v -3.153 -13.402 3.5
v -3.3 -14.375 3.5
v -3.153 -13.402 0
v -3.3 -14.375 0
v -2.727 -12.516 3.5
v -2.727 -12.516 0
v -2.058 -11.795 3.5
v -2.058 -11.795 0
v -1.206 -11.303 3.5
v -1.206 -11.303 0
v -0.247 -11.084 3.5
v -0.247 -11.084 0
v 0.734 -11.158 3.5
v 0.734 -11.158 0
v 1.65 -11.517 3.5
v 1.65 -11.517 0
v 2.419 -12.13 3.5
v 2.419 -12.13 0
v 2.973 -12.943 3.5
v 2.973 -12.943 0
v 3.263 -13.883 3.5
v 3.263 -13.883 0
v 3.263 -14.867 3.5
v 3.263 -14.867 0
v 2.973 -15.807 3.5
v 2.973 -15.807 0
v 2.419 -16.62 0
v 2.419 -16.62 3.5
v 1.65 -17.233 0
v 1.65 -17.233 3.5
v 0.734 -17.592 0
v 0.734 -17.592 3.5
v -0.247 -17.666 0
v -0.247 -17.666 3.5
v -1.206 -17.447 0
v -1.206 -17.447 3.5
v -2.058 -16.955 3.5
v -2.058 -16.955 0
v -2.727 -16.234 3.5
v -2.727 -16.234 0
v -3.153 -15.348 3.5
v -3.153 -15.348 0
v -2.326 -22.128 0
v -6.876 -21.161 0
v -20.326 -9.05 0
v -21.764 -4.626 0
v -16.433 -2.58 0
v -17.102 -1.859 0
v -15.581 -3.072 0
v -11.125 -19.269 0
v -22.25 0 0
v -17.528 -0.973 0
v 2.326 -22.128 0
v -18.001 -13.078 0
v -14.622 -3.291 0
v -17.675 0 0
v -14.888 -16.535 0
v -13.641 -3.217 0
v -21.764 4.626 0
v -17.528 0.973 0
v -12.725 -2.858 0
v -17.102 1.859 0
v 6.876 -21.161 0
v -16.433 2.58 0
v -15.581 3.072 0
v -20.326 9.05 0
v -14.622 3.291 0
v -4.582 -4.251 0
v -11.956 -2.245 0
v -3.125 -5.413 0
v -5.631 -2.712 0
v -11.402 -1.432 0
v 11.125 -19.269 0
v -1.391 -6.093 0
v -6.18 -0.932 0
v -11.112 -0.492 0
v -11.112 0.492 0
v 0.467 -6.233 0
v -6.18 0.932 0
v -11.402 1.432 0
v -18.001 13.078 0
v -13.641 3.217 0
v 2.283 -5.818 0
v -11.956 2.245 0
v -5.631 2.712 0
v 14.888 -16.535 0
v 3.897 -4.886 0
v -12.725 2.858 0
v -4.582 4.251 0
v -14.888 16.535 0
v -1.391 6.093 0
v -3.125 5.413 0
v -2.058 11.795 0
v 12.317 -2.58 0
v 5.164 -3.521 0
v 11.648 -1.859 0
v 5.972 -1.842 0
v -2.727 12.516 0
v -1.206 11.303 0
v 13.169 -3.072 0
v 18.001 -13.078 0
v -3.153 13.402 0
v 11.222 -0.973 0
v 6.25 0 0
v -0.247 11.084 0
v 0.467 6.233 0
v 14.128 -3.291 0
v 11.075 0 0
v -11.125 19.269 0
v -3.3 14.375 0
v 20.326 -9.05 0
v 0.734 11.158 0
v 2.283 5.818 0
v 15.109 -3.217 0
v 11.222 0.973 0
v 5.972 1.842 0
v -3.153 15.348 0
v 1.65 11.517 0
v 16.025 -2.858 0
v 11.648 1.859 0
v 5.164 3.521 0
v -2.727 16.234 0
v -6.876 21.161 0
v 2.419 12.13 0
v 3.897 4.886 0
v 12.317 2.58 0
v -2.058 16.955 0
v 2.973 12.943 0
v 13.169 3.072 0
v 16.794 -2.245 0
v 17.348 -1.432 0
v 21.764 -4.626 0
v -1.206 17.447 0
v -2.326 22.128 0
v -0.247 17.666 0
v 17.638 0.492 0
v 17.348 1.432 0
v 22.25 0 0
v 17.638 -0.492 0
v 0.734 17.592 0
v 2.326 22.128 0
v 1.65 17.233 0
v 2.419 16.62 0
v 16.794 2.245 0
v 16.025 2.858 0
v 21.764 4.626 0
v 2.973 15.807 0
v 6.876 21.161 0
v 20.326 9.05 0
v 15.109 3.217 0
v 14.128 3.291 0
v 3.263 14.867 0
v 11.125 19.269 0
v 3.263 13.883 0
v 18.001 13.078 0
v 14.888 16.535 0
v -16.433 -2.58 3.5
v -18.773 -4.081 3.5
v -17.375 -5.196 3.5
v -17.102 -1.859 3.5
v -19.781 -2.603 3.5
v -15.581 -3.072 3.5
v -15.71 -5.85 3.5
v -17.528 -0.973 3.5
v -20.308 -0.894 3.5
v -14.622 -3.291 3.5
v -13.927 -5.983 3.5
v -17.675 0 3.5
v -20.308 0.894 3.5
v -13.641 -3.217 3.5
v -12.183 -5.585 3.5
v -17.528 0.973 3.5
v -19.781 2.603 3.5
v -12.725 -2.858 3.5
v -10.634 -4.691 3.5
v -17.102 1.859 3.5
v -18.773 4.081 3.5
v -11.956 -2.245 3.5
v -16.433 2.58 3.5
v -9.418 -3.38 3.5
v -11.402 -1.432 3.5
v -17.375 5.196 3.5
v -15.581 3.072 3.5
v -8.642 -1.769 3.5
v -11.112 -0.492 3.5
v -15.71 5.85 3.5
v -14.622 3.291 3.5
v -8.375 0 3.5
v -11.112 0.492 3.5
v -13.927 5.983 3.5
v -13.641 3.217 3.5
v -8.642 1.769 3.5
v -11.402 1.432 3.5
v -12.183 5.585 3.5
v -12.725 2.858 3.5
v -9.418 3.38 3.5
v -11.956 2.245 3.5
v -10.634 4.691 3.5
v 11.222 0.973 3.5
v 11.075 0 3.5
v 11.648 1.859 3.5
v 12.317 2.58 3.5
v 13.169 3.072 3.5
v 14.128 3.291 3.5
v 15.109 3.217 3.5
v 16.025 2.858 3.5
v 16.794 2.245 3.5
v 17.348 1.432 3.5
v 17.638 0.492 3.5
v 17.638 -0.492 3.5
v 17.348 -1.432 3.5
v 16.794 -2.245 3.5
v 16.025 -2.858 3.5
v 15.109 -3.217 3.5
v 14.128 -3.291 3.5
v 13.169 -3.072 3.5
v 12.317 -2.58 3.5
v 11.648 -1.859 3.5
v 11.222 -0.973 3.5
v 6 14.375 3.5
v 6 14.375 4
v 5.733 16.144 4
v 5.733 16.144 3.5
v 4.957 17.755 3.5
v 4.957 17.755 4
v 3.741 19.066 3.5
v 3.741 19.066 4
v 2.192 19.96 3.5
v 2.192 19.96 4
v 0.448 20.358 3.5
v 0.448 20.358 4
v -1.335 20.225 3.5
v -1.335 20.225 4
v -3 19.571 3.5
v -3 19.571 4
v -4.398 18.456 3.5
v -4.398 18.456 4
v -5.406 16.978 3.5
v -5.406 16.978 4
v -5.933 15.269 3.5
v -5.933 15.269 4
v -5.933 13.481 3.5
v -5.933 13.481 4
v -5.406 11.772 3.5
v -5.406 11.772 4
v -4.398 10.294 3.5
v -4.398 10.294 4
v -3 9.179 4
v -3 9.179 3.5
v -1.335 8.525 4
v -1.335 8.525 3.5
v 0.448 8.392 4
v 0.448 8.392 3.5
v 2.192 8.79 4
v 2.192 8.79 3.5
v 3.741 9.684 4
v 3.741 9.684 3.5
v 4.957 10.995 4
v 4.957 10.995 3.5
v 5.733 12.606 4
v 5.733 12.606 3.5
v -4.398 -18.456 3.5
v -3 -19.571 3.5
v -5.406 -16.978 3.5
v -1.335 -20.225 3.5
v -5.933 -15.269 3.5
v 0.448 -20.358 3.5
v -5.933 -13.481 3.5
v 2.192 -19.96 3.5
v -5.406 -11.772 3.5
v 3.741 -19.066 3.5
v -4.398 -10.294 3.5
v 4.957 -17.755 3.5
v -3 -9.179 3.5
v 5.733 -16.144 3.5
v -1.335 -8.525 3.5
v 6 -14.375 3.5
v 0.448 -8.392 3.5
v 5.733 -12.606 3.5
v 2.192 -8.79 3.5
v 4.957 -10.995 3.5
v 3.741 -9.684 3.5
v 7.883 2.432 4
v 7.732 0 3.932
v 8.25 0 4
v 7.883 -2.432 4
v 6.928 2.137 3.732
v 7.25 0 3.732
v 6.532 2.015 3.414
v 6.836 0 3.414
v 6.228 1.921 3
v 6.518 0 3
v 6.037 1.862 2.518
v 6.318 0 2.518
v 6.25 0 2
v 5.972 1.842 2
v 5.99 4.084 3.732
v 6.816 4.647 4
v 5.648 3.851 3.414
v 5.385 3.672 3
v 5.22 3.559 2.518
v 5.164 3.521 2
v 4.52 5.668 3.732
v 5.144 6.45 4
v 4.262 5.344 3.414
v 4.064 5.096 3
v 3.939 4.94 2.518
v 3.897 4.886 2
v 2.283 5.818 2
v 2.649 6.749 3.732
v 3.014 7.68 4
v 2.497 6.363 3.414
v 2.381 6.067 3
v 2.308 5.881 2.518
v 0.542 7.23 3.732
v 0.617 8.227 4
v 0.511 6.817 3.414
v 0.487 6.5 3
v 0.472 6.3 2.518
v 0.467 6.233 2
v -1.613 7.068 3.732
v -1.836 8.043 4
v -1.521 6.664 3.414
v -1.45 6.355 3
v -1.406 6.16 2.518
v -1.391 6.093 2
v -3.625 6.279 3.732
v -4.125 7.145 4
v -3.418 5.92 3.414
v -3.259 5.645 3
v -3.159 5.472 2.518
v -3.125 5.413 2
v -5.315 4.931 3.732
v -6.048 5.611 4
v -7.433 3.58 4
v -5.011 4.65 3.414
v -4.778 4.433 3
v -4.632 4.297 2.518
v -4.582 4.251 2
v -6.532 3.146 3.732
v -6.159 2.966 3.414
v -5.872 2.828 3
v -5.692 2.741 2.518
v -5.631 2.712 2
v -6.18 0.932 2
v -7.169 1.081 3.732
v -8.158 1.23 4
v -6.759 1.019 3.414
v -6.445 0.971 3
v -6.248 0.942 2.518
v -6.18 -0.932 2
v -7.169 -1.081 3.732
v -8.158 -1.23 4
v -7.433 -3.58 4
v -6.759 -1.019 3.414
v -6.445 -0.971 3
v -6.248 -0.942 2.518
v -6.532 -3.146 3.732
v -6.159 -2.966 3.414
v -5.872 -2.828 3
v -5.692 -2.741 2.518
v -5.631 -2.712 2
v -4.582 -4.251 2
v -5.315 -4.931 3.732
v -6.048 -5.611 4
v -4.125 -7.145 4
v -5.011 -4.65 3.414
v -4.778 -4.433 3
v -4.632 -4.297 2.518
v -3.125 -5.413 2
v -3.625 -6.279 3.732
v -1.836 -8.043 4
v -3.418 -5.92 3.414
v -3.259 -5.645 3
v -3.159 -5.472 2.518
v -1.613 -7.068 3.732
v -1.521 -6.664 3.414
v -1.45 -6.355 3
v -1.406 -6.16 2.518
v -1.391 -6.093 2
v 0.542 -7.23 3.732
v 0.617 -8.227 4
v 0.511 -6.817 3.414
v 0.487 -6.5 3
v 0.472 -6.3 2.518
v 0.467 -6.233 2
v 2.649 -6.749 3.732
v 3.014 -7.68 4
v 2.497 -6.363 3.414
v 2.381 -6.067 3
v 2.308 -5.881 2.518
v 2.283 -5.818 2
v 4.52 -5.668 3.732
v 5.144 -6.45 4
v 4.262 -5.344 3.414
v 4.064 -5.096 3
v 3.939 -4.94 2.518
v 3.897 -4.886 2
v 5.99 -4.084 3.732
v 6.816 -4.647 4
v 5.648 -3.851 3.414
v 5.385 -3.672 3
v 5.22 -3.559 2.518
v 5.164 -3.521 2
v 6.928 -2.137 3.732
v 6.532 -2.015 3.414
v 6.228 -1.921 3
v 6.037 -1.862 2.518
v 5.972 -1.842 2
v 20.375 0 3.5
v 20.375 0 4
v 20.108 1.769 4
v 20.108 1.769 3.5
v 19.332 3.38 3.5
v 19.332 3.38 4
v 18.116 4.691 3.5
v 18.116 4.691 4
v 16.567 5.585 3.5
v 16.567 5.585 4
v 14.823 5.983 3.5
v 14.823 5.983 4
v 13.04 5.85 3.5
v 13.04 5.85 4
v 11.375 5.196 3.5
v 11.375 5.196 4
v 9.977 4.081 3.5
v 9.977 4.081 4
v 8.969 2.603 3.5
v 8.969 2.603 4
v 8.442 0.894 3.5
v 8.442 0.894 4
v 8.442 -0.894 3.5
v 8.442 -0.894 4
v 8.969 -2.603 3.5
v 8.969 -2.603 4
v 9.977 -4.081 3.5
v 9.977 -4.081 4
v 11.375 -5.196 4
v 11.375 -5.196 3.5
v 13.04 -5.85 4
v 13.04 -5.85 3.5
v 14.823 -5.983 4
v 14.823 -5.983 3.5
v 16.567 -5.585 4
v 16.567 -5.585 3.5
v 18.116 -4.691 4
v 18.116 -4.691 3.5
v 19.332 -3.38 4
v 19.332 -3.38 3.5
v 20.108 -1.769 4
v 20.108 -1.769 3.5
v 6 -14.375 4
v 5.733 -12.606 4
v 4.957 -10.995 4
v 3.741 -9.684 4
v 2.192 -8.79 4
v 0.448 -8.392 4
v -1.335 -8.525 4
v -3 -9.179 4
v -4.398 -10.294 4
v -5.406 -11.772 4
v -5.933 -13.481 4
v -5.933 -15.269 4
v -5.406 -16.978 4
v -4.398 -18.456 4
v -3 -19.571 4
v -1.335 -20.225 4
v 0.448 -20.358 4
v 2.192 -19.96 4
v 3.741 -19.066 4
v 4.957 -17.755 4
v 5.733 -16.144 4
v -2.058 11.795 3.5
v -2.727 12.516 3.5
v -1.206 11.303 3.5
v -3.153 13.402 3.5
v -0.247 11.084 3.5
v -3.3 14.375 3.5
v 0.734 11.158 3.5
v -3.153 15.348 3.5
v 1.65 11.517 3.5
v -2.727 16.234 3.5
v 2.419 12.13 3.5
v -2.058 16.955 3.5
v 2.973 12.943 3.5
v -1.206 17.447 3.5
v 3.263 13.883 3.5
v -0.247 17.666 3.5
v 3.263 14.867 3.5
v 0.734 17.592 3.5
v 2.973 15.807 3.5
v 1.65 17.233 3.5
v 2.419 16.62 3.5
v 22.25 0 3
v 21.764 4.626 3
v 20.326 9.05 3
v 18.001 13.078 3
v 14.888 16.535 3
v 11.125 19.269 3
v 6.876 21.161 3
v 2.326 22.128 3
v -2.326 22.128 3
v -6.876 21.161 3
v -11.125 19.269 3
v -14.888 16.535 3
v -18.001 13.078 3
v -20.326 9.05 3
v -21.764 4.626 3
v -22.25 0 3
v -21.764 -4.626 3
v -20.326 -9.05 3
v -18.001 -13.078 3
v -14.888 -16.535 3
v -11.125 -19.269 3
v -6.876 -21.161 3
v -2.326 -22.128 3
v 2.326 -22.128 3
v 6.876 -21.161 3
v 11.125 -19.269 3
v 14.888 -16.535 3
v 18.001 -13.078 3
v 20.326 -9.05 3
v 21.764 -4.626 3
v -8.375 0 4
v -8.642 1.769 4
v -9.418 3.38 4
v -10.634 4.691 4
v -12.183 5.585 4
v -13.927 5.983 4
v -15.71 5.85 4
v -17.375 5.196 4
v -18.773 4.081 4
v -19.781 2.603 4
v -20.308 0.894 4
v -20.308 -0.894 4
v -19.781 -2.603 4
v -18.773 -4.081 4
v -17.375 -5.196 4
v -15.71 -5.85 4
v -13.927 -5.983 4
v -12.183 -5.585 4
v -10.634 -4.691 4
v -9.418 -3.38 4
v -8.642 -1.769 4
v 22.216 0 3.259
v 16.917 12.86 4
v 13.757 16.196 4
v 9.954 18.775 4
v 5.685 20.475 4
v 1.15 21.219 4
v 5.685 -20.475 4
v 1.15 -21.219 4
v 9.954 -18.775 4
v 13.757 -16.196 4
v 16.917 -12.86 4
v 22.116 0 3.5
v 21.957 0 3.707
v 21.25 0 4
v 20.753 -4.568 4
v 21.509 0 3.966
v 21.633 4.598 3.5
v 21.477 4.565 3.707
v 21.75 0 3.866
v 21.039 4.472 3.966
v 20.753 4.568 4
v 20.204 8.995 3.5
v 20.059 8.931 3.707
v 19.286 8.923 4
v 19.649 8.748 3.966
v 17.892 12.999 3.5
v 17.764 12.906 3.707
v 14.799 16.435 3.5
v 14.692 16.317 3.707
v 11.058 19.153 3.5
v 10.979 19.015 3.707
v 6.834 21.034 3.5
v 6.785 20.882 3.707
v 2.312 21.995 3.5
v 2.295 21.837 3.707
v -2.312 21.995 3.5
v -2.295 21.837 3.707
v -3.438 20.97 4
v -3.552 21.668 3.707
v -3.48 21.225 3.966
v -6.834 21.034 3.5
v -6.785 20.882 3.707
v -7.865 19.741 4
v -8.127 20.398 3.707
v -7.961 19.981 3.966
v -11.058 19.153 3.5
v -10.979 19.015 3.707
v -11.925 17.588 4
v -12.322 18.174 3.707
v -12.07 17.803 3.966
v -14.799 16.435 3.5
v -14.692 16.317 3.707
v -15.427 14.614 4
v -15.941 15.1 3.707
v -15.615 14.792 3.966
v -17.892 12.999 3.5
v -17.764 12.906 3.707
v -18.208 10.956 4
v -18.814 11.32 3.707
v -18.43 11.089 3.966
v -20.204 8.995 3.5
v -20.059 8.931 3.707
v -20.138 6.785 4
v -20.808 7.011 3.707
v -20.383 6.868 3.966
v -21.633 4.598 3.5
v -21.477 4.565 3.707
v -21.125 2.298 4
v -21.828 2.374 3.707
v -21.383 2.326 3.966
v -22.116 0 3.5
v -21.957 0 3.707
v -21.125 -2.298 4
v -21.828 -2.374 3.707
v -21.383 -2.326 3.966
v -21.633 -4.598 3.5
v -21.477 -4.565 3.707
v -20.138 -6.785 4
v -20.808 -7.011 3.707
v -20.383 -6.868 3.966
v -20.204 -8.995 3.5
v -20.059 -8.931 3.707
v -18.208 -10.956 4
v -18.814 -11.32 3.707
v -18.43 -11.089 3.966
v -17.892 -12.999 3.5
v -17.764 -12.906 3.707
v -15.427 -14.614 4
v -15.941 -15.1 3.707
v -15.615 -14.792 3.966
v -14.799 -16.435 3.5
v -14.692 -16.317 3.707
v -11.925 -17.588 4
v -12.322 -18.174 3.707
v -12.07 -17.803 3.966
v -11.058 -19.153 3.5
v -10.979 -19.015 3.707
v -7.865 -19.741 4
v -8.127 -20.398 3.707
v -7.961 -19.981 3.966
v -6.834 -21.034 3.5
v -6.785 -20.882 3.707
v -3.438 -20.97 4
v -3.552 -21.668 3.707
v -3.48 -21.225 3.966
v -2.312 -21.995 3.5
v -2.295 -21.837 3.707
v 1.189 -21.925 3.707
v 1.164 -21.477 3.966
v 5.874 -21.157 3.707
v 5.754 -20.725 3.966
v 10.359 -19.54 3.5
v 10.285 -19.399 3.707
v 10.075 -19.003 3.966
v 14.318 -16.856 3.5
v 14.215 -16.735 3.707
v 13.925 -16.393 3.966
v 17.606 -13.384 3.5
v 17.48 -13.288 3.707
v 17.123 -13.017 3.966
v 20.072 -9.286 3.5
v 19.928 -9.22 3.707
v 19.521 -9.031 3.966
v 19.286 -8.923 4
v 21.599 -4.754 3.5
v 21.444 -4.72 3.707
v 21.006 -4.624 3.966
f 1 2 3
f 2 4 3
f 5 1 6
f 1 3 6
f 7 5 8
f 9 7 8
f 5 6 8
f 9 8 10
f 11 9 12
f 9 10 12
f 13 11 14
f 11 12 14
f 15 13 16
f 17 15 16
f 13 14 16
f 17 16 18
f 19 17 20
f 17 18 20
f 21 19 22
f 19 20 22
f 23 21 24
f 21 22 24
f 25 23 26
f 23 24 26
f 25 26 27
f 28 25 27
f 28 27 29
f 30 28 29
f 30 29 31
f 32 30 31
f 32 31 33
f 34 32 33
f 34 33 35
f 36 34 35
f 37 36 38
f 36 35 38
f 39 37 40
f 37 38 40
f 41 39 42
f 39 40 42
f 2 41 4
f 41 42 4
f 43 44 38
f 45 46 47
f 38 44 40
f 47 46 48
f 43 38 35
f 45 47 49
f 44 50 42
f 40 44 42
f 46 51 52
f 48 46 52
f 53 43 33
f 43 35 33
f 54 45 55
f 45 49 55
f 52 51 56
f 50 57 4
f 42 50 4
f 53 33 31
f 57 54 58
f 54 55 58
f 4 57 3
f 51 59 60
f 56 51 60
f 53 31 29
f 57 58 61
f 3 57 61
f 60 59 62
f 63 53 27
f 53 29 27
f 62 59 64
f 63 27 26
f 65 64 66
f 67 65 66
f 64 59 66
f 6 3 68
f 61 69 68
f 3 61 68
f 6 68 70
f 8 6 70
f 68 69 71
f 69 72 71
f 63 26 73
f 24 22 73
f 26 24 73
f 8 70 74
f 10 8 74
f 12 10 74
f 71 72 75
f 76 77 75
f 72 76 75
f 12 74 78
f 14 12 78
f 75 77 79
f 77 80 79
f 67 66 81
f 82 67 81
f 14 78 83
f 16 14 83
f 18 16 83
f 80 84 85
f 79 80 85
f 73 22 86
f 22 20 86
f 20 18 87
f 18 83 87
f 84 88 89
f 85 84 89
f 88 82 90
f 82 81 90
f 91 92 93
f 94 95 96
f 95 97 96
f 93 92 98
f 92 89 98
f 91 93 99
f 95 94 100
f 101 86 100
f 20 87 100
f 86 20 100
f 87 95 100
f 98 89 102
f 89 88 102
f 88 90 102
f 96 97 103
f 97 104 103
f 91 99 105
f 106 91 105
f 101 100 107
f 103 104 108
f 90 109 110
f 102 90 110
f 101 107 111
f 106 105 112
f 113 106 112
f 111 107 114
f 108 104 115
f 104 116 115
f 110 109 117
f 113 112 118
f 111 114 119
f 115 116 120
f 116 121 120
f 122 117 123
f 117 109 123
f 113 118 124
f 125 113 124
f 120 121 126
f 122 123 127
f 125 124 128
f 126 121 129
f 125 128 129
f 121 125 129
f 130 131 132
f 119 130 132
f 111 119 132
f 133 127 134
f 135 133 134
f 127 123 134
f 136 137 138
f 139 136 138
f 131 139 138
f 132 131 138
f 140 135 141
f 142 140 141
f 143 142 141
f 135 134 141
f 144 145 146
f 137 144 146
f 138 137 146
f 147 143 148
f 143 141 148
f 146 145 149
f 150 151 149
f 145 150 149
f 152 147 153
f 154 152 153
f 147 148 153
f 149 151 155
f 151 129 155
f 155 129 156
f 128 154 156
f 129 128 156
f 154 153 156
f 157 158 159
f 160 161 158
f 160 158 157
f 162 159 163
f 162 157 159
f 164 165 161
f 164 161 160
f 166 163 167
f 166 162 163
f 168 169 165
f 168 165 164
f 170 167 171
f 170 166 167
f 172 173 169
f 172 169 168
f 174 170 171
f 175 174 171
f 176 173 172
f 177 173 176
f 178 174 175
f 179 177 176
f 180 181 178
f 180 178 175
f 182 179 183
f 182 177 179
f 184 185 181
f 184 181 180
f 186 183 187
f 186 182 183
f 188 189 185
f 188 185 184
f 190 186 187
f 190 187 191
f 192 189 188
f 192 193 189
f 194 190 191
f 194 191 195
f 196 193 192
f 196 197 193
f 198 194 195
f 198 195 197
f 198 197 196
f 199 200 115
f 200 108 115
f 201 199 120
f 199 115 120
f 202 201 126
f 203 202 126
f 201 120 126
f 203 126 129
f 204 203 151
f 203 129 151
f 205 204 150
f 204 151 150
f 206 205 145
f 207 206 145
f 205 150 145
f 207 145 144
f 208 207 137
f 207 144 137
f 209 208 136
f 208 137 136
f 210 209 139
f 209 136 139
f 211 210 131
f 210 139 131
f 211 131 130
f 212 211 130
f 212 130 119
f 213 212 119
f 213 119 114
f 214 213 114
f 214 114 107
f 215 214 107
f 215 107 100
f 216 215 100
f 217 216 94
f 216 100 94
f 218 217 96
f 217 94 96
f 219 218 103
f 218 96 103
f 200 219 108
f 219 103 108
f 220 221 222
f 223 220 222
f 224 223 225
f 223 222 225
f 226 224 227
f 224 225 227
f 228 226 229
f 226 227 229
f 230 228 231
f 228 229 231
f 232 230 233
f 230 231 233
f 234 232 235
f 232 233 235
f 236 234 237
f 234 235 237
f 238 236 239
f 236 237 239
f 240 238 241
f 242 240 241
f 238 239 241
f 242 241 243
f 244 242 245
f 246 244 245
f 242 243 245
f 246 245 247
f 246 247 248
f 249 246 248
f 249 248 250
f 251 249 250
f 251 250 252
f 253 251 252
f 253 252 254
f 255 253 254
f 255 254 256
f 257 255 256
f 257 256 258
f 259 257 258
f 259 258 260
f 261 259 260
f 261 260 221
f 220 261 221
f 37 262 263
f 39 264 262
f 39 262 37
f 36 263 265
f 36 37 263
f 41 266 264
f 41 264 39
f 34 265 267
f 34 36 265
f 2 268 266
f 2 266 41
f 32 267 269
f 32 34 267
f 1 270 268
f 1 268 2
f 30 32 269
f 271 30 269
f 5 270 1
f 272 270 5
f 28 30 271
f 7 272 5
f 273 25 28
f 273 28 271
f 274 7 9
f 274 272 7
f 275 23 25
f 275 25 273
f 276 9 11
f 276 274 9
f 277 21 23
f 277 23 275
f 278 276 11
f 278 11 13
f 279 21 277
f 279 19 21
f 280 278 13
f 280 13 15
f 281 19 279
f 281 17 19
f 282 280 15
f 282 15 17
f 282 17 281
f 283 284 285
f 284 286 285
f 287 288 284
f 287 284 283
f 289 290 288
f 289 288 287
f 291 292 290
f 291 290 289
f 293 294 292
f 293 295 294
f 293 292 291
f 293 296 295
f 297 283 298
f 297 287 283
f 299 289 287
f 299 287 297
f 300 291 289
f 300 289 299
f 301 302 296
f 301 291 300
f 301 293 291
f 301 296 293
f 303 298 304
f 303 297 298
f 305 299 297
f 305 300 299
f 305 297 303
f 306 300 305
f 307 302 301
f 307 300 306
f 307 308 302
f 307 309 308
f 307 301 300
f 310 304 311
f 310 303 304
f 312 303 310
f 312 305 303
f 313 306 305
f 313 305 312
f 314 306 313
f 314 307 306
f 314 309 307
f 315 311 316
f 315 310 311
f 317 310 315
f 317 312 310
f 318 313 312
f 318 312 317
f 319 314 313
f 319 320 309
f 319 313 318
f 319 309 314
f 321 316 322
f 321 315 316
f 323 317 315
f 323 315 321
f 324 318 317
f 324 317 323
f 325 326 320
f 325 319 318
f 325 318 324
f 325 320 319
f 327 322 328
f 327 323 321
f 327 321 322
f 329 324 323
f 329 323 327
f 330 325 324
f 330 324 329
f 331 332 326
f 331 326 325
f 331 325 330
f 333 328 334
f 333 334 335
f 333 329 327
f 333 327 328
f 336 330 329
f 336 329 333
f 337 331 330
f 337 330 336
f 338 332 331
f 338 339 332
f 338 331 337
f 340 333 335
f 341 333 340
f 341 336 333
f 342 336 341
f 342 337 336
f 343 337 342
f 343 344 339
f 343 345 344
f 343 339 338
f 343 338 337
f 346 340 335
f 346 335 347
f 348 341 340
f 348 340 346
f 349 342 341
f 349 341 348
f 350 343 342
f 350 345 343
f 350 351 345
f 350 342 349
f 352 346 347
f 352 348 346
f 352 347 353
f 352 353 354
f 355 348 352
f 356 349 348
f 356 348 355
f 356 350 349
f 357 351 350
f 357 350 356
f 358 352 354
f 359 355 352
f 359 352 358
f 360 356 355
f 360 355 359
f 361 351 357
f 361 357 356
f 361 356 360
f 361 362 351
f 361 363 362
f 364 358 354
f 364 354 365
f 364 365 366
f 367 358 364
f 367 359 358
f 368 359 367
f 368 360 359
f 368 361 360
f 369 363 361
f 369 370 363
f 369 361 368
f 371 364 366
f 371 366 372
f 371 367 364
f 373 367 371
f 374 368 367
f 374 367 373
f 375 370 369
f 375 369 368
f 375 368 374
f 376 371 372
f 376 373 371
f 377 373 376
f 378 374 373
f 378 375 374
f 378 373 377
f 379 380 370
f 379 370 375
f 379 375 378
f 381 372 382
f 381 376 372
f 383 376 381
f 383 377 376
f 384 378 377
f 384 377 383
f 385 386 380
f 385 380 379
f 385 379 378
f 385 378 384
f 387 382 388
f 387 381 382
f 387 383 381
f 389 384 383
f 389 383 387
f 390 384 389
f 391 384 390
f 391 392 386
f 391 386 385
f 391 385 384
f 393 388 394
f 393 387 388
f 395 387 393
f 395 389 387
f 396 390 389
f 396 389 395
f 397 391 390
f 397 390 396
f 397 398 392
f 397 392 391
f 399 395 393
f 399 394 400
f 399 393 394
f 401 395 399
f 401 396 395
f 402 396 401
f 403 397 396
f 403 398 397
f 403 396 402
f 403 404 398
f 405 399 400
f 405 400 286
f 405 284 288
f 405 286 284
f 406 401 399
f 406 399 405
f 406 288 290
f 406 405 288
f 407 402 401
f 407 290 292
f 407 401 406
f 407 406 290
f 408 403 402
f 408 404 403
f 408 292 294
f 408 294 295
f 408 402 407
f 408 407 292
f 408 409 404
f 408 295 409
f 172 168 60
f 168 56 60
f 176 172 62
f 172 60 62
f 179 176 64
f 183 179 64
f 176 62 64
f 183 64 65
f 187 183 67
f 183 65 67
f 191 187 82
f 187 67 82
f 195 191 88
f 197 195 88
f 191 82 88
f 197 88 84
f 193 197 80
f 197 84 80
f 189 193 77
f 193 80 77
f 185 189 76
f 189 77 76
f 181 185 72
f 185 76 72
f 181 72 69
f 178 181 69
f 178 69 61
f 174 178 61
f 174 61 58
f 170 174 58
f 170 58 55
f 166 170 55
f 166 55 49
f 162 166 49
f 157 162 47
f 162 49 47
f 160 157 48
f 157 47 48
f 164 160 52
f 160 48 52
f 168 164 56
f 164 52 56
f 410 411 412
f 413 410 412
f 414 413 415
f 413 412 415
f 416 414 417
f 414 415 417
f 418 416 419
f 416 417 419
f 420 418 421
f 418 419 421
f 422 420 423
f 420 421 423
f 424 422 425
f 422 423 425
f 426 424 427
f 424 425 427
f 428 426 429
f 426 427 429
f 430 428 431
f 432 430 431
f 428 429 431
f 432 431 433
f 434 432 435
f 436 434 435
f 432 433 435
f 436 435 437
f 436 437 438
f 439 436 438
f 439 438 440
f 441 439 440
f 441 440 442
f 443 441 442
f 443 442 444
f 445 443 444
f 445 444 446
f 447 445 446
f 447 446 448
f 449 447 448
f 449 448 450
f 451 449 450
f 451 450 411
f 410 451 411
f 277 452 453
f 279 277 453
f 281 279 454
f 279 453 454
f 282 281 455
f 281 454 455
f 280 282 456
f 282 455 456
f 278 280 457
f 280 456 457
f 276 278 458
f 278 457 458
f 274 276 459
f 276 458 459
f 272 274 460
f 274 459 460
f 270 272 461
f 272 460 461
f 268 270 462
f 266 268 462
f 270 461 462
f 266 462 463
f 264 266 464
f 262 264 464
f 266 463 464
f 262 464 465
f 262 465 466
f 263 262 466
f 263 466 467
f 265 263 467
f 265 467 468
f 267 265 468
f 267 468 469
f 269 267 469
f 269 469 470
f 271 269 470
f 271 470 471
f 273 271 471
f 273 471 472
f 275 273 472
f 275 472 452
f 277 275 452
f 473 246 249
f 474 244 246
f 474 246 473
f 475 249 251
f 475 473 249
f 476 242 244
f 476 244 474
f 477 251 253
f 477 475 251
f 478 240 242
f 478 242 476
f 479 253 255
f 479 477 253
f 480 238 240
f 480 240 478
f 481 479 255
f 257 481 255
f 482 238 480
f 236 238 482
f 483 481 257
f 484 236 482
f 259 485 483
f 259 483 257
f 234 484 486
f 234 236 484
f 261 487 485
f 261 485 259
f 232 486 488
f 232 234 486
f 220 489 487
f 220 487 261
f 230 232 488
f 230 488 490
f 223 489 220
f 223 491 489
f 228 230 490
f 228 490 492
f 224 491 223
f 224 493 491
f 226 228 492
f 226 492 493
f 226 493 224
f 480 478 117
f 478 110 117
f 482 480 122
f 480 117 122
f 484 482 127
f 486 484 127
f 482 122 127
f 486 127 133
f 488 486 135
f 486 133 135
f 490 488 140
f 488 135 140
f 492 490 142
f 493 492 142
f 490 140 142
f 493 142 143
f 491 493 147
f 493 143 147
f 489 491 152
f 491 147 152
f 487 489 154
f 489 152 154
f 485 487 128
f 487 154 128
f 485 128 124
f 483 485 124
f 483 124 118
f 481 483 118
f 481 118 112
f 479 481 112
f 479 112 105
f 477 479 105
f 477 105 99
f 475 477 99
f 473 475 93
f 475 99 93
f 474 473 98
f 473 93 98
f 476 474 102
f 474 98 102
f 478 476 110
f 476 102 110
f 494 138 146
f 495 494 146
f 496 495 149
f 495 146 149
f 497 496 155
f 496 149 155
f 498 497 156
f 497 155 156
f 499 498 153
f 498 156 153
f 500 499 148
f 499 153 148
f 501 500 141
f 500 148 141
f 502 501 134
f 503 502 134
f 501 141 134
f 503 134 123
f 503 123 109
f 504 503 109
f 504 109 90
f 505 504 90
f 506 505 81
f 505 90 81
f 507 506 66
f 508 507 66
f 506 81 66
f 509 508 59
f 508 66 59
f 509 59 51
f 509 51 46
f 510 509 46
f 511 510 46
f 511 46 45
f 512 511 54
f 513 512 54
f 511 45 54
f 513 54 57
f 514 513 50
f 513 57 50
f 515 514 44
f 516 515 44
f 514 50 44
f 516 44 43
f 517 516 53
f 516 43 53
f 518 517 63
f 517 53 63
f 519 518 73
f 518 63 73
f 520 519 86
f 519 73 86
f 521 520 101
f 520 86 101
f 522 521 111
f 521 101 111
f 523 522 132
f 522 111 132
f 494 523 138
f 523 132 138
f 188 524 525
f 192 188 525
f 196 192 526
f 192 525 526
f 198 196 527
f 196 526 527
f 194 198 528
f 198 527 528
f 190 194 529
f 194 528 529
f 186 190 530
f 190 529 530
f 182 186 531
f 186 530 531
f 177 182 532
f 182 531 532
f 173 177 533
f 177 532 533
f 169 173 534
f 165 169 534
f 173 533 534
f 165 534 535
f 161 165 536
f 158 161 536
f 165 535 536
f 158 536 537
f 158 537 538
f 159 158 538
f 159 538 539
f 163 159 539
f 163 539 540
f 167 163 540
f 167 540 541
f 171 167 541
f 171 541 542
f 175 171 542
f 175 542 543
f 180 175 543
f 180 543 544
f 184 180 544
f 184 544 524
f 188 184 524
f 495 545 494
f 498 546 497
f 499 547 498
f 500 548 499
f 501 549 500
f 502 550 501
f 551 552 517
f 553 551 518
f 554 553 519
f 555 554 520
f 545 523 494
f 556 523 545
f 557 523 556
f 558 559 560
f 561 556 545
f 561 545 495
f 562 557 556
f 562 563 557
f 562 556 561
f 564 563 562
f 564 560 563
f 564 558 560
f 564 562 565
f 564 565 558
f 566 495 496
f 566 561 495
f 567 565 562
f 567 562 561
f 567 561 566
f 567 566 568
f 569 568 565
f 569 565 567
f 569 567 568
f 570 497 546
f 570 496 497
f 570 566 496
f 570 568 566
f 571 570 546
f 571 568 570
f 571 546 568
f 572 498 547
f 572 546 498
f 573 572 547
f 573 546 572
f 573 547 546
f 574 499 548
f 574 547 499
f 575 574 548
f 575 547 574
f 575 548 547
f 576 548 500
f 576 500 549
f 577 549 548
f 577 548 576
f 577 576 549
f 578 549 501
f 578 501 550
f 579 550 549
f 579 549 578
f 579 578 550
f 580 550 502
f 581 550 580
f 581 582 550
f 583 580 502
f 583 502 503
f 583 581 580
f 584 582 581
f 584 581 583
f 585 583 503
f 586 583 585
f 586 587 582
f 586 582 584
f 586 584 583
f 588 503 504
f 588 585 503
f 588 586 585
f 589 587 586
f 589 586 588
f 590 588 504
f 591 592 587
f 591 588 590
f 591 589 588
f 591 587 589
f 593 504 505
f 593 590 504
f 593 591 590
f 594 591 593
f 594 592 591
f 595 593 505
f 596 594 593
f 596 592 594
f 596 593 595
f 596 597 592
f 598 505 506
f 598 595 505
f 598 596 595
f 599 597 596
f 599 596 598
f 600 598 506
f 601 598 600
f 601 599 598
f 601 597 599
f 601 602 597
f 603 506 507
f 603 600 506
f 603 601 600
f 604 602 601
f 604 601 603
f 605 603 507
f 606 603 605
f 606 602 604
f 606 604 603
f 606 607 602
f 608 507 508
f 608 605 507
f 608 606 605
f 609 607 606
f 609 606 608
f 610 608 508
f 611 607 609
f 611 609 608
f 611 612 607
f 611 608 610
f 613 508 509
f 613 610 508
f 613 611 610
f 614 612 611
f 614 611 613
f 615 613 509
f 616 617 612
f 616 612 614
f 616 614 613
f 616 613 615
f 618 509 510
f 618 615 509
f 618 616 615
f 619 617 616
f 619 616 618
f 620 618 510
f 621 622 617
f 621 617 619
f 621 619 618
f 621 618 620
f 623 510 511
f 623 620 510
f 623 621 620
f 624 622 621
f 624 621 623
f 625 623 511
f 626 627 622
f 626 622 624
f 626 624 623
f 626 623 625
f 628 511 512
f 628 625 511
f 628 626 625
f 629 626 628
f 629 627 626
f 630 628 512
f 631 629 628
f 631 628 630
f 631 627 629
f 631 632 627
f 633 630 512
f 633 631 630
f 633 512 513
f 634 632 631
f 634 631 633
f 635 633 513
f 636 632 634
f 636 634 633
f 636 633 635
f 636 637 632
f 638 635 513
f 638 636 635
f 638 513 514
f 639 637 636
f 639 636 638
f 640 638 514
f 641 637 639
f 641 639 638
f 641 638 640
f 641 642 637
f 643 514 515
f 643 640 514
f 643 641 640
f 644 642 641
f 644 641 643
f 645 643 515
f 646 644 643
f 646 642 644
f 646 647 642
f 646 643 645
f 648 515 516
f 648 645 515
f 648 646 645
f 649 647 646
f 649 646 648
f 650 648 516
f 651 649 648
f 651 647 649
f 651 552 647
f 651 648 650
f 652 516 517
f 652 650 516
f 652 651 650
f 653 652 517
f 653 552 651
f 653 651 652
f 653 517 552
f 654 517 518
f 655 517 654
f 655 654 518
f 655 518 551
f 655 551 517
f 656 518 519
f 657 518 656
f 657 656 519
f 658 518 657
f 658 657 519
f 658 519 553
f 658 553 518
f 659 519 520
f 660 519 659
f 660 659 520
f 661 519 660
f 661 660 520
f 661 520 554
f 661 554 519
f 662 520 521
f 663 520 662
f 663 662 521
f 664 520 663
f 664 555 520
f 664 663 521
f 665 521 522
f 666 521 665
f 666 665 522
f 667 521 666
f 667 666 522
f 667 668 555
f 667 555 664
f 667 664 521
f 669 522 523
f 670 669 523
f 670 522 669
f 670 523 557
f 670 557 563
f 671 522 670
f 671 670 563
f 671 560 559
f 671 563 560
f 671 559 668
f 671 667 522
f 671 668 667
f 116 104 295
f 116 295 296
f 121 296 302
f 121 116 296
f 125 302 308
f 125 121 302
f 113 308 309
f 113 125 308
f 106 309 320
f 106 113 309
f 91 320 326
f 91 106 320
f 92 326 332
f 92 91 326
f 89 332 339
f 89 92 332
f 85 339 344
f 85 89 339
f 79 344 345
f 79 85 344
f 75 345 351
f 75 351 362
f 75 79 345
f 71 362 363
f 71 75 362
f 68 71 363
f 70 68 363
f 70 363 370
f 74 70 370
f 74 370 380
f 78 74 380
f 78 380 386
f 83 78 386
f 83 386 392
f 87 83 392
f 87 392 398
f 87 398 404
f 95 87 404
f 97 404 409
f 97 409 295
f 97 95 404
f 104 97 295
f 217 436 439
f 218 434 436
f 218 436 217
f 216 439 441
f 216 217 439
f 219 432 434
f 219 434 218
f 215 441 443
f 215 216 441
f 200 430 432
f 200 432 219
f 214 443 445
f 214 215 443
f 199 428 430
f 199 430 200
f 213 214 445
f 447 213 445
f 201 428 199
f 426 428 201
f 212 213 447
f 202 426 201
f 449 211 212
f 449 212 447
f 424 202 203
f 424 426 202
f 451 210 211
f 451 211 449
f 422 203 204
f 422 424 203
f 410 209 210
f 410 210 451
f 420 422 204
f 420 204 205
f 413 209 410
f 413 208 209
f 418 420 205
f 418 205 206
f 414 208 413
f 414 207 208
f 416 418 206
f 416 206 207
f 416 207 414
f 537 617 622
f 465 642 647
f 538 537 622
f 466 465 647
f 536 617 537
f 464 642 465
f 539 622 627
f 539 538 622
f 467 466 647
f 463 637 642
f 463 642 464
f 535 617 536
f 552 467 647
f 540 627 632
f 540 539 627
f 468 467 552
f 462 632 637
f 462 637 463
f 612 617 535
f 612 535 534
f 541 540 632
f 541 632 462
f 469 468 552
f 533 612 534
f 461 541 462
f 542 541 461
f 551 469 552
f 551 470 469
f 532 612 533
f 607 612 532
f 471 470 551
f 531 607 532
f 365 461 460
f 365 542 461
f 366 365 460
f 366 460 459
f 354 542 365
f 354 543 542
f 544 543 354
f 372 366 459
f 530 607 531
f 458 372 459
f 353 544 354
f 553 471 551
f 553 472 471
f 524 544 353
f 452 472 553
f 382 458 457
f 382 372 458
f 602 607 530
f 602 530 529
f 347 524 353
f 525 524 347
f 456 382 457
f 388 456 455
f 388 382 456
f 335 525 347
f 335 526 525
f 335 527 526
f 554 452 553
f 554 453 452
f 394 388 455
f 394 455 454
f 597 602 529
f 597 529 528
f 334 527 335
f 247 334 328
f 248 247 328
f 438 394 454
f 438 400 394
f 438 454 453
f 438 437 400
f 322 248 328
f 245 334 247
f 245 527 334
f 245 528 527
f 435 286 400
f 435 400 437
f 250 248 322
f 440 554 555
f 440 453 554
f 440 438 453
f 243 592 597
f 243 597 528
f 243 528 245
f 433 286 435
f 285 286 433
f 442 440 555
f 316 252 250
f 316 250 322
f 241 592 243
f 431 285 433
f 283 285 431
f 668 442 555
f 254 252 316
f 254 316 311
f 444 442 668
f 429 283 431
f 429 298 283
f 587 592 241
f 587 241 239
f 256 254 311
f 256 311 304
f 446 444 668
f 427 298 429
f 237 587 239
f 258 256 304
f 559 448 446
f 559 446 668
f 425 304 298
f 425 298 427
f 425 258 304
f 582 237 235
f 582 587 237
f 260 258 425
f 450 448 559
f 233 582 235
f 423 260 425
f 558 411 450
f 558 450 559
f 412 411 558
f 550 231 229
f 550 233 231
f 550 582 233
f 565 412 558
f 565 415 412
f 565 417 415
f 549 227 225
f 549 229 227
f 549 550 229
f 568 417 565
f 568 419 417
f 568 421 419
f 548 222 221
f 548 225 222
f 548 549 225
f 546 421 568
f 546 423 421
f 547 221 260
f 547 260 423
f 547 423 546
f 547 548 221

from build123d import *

# Parameters (mm, degrees)
SKETCH_1_R                   = 22.25
SKETCH_1_R_2                 = 6.25
EXTRUDE_1_DEPTH              = 4
HOLE_WIZARD_M6_1_D           = 6.6
HOLE_WIZARD_M6_1_CBORE_D     = 12
HOLE_WIZARD_M6_1_CBORE_DEPTH = 0.5
FILLET_1_R                   = 1
FILLET_2_R                   = 2


with BuildPart() as part:
    # 草图1 → 凸台-拉伸1 (new body)
    with BuildSketch(Plane.XY):
        Circle(SKETCH_1_R)
        Circle(SKETCH_1_R_2, mode=Mode.SUBTRACT)
    extrude(amount=EXTRUDE_1_DEPTH)

    # M6 六角头螺栓的柱形沉头孔1 (through all)
    with Locations(Plane.XY.offset(4)):
        with Locations((-14.375, 0), (0, 14.375), (14.375, 0), (0, -14.375)):
            CounterBoreHole(HOLE_WIZARD_M6_1_D / 2, HOLE_WIZARD_M6_1_CBORE_D / 2, HOLE_WIZARD_M6_1_CBORE_DEPTH)

    # 圆角1
    fillet_1_edges = [part.edges().sort_by_distance(p)[0] for p in [
        (-22.25, 0, 4),
    ]]
    fillet(fillet_1_edges, radius=FILLET_1_R)

    # 圆角2
    fillet_2_edges = [part.edges().sort_by_distance(p)[0] for p in [
        (-6.25, 0, 4),
    ]]
    fillet(fillet_2_edges, radius=FILLET_2_R)


solid = part.part
